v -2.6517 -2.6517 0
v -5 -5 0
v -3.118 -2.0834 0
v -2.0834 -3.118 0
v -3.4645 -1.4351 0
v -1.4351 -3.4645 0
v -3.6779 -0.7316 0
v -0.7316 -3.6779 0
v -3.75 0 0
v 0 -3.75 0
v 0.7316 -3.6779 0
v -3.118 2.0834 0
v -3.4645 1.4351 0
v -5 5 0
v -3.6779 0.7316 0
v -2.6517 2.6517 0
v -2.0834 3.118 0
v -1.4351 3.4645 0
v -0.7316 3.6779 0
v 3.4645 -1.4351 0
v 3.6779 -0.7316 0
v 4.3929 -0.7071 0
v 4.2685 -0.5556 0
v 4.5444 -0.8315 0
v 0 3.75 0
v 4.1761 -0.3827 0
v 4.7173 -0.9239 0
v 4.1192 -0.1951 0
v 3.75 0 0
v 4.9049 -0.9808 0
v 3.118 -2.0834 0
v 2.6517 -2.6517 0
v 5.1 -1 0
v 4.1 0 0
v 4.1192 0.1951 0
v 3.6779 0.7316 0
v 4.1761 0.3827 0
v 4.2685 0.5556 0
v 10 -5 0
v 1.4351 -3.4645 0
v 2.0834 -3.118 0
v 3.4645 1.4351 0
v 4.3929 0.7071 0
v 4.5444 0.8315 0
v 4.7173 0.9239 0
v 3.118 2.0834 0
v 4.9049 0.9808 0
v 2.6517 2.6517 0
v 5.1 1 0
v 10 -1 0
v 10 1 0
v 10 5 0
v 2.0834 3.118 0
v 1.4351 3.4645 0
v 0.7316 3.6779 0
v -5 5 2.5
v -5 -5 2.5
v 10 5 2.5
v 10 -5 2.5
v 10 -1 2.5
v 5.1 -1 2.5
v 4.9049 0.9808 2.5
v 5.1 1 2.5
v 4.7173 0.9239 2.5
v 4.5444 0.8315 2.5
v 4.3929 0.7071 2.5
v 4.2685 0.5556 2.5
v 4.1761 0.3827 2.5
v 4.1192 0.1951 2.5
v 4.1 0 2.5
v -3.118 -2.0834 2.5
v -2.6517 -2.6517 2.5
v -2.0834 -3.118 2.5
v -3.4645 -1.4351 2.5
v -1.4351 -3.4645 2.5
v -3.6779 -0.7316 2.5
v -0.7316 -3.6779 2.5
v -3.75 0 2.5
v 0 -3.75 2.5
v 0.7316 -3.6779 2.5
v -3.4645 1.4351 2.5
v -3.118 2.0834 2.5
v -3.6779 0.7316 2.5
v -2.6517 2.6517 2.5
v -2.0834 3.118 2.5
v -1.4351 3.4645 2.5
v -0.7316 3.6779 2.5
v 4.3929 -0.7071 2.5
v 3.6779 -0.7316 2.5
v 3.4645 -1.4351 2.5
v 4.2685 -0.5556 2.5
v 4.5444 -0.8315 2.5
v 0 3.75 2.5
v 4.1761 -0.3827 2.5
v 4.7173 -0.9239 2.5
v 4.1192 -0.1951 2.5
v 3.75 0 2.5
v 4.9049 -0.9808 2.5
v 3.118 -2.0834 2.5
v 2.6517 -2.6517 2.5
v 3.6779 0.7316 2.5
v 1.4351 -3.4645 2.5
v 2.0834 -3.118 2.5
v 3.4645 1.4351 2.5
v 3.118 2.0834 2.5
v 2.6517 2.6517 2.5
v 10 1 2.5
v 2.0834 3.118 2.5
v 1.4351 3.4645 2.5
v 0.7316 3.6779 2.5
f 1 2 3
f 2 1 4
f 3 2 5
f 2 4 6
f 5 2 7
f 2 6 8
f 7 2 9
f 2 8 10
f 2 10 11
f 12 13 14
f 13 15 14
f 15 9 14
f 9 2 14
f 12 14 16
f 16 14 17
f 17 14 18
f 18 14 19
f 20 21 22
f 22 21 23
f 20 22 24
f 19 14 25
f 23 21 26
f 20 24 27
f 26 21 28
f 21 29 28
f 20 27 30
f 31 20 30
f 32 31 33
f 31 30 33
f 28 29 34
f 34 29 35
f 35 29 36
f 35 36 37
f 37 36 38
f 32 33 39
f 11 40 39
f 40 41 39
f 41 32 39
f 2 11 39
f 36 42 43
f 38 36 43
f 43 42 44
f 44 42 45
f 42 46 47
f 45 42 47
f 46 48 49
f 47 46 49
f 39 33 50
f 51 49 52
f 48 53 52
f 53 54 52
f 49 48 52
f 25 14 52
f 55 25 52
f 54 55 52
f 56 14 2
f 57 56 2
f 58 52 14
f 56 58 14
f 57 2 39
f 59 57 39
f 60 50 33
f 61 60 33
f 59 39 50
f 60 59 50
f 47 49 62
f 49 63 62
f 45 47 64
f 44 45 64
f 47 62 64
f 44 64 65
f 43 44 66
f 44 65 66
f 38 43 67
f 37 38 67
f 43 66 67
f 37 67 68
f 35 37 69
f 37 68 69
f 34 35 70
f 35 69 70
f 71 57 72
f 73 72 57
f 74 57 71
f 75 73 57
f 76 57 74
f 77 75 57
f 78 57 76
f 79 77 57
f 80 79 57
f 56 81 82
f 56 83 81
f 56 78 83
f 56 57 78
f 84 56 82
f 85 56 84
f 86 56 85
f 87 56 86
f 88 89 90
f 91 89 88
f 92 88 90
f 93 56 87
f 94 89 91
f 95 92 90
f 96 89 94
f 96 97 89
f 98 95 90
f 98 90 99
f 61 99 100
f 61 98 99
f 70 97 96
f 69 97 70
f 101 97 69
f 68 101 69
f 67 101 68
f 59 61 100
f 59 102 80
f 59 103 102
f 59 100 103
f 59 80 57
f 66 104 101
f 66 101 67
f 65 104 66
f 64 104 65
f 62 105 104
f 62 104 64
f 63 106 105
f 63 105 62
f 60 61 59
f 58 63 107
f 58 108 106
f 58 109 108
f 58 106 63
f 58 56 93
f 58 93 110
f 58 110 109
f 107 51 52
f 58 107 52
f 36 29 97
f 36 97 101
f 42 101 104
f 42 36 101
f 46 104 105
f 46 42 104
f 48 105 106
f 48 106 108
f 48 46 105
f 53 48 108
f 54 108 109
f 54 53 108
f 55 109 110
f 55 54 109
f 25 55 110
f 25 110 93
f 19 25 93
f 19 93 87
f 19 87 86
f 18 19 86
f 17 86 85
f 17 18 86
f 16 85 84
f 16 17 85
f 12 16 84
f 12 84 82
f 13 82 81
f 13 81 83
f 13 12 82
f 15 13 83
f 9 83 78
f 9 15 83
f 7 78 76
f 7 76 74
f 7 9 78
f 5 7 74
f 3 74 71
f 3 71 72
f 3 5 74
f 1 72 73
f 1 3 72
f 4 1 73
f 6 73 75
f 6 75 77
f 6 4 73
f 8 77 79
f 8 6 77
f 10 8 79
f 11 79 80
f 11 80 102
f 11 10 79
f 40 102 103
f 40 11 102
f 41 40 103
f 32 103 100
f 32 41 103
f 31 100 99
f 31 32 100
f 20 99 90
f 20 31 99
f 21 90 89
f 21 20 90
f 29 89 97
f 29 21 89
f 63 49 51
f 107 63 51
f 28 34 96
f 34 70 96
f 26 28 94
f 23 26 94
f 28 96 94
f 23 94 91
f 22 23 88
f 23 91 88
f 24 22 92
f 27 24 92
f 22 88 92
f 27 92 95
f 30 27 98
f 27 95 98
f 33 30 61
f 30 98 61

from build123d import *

# Parameters (mm, degrees)
F0_R     = 3.75
F1_DEPTH = 2.5
F2_R     = 1
F3_R     = 0.99999


# Not quite as in the source:
# - a fillet or chamfer is up to 0.001 mm smaller than in the source, because OpenCascade refuses the exact size


with BuildPart() as f1:
    # F0 (on Top) → F1 (new body)
    with BuildSketch(Plane.XY):
        Polygon((10, 5), (-5, 5), (-5, -5), (10, -5), (10, -2.5), (10, -1), (4.1, -1), (4.1, 1), (10, 1), (10, 2.5), align=None)
        Circle(F0_R, mode=Mode.SUBTRACT)
    extrude(amount=F1_DEPTH)

    # F2
    f2_edges = [f1.edges().sort_by_distance(p)[0] for p in [
        (4.1, 1, 1.25),
    ]]
    fillet(f2_edges, radius=F2_R)

    # F3 (radius 1 in the source; OpenCascade refuses exactly that, so slightly less here)
    f3_edges = [f1.edges().sort_by_distance(p)[0] for p in [
        (4.1, -1, 1.25),
    ]]
    fillet(f3_edges, radius=F3_R)


solid = f1.part
